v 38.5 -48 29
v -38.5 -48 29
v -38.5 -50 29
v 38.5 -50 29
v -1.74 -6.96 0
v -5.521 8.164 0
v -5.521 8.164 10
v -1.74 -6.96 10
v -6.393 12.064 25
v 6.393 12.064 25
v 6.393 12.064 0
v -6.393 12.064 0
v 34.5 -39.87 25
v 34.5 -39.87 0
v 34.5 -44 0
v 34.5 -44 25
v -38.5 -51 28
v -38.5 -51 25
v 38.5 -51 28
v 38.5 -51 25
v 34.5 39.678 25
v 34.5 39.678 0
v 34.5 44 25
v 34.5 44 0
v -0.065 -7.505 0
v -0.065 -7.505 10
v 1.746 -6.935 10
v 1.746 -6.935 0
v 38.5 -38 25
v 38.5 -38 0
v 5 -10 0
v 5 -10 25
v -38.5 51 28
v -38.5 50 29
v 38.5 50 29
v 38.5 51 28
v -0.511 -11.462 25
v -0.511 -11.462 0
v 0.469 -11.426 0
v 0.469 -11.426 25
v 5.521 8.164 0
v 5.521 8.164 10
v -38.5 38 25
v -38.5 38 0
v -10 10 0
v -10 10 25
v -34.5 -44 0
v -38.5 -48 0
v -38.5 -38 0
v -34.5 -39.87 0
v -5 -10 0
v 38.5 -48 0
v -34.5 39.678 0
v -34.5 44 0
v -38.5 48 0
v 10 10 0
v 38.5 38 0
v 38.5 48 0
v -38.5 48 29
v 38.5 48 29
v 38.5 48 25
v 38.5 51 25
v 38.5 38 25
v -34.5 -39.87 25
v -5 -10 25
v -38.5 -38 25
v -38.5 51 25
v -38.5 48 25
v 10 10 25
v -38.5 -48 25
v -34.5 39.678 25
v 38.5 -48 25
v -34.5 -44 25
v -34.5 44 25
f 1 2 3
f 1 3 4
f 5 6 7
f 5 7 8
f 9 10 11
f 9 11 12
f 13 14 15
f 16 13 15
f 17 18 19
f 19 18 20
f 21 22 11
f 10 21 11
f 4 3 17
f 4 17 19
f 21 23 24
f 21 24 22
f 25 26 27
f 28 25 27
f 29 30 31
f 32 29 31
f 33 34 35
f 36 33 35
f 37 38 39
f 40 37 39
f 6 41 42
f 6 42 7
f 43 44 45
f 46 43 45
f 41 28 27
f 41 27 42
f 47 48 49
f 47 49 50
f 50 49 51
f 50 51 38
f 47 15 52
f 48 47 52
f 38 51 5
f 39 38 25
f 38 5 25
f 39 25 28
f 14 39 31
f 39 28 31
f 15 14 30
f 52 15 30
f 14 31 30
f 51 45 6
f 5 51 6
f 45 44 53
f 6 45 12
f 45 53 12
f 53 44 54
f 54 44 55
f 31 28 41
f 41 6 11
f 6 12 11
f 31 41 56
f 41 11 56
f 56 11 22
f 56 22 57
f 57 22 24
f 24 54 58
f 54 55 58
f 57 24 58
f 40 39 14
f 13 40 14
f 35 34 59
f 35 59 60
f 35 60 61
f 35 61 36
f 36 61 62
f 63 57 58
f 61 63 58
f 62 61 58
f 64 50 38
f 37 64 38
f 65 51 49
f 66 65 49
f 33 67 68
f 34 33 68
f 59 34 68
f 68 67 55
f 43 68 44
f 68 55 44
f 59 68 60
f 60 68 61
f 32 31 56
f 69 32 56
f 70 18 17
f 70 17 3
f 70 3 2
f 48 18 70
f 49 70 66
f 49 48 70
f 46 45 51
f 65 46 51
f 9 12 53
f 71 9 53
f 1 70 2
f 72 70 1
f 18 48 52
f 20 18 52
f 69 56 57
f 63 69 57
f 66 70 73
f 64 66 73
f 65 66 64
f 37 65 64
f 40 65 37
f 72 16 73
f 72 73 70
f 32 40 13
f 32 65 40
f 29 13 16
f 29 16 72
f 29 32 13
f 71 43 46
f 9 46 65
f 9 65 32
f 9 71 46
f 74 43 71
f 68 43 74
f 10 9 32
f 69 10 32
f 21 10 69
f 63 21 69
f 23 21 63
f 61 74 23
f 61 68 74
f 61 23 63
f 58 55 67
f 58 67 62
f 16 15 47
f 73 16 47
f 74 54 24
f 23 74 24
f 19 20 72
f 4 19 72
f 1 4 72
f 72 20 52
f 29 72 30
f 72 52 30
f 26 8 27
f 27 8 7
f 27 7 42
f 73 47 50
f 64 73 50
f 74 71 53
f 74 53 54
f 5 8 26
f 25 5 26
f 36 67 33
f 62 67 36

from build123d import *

# Parameters (mm, degrees)
F1_DEPTH   = 25
F2_DEPTH   = 10
F0_W       = 77
F0_H       = 3
F3_DEPTH   = 29
F4_SIZE2   = 3
F4_SIZE    = 25
F4_2_SIZE2 = 3
F4_2_SIZE  = 25
F5_SIZE    = 1


with BuildPart() as f1:
    # F0 (on Top) → F1 (new body)
    with BuildSketch(Plane.XY):
        Polygon((-38.5, -38), (-38.5, -48), (38.5, -48), (38.5, -38), (5, -10), (0.4688645929, -11.4259910617), (34.5, -39.8699251333), (34.5, -44), (-34.5, -44), (-34.5, -39.8699251333), (-0.5114898408, -11.4616181345), (-5, -10), align=None)
        Polygon((-10, 10), (-5, -10), (-0.5114898408, -11.4616181345), (0.4688645929, -11.4259910617), (5, -10), (10, 10), (6.3927714964, 12.0635084879), (-6.3927714964, 12.0635084879), align=None)
        Polygon((5.520849137, 8.1635084879), (1.7461076086, -6.9354576256), (-0.0650228365, -7.5054374638), (-1.7399680433, -6.9600158871), (-5.520849137, 8.1635084879), align=None, mode=Mode.SUBTRACT)
        Polygon((-38.5, 38), (-10, 10), (-6.3927714964, 12.0635084879), (-34.5, 39.6776277196), (-34.5, 44), (34.5, 44), (34.5, 39.6776277196), (6.3927714964, 12.0635084879), (10, 10), (38.5, 38), (38.5, 48), (-38.5, 48), align=None)
        Polygon((-0.0650228365, -7.5054374638), (1.7461076086, -6.9354576256), (5.520849137, 8.1635084879), (-5.520849137, 8.1635084879), (-1.7399680433, -6.9600158871), align=None)
    extrude(amount=F1_DEPTH)

    # F0 (on Top) → F2 (cut)
    with BuildSketch(Plane.XY):
        Polygon((-0.0650228365, -7.5054374638), (1.7461076086, -6.9354576256), (5.520849137, 8.1635084879), (-5.520849137, 8.1635084879), (-1.7399680433, -6.9600158871), align=None)
    extrude(amount=F2_DEPTH, mode=Mode.SUBTRACT)

    # F0 (on Top) → F3 (join)
    with BuildSketch(Plane.XY):
        with Locations((0, -49.5)):
            Rectangle(F0_W, F0_H)
        with Locations((0, 49.5)):
            Rectangle(F0_W, F0_H)
    extrude(amount=F3_DEPTH)

    # F4
    f4_edges = [f1.edges().sort_by_distance(p)[0] for p in [
        (0, -51, 0),
    ]]
    f4_side = f1.faces().sort_by_distance((0, -51, 14.5))[0]
    chamfer(f4_edges, length=F4_SIZE, length2=F4_SIZE2, reference=f4_side)

    # F4#2
    f4_2_edges = [f1.edges().sort_by_distance(p)[0] for p in [
        (0, 51, 0),
    ]]
    f4_2_side = f1.faces().sort_by_distance((0, 51, 14.5))[0]
    chamfer(f4_2_edges, length=F4_2_SIZE, length2=F4_2_SIZE2, reference=f4_2_side)

    # F5
    f5_edges = [f1.edges().sort_by_distance(p)[0] for p in [
        (0, -51, 29),
        (0, 51, 29),
    ]]
    chamfer(f5_edges, length=F5_SIZE)


solid = f1.part
